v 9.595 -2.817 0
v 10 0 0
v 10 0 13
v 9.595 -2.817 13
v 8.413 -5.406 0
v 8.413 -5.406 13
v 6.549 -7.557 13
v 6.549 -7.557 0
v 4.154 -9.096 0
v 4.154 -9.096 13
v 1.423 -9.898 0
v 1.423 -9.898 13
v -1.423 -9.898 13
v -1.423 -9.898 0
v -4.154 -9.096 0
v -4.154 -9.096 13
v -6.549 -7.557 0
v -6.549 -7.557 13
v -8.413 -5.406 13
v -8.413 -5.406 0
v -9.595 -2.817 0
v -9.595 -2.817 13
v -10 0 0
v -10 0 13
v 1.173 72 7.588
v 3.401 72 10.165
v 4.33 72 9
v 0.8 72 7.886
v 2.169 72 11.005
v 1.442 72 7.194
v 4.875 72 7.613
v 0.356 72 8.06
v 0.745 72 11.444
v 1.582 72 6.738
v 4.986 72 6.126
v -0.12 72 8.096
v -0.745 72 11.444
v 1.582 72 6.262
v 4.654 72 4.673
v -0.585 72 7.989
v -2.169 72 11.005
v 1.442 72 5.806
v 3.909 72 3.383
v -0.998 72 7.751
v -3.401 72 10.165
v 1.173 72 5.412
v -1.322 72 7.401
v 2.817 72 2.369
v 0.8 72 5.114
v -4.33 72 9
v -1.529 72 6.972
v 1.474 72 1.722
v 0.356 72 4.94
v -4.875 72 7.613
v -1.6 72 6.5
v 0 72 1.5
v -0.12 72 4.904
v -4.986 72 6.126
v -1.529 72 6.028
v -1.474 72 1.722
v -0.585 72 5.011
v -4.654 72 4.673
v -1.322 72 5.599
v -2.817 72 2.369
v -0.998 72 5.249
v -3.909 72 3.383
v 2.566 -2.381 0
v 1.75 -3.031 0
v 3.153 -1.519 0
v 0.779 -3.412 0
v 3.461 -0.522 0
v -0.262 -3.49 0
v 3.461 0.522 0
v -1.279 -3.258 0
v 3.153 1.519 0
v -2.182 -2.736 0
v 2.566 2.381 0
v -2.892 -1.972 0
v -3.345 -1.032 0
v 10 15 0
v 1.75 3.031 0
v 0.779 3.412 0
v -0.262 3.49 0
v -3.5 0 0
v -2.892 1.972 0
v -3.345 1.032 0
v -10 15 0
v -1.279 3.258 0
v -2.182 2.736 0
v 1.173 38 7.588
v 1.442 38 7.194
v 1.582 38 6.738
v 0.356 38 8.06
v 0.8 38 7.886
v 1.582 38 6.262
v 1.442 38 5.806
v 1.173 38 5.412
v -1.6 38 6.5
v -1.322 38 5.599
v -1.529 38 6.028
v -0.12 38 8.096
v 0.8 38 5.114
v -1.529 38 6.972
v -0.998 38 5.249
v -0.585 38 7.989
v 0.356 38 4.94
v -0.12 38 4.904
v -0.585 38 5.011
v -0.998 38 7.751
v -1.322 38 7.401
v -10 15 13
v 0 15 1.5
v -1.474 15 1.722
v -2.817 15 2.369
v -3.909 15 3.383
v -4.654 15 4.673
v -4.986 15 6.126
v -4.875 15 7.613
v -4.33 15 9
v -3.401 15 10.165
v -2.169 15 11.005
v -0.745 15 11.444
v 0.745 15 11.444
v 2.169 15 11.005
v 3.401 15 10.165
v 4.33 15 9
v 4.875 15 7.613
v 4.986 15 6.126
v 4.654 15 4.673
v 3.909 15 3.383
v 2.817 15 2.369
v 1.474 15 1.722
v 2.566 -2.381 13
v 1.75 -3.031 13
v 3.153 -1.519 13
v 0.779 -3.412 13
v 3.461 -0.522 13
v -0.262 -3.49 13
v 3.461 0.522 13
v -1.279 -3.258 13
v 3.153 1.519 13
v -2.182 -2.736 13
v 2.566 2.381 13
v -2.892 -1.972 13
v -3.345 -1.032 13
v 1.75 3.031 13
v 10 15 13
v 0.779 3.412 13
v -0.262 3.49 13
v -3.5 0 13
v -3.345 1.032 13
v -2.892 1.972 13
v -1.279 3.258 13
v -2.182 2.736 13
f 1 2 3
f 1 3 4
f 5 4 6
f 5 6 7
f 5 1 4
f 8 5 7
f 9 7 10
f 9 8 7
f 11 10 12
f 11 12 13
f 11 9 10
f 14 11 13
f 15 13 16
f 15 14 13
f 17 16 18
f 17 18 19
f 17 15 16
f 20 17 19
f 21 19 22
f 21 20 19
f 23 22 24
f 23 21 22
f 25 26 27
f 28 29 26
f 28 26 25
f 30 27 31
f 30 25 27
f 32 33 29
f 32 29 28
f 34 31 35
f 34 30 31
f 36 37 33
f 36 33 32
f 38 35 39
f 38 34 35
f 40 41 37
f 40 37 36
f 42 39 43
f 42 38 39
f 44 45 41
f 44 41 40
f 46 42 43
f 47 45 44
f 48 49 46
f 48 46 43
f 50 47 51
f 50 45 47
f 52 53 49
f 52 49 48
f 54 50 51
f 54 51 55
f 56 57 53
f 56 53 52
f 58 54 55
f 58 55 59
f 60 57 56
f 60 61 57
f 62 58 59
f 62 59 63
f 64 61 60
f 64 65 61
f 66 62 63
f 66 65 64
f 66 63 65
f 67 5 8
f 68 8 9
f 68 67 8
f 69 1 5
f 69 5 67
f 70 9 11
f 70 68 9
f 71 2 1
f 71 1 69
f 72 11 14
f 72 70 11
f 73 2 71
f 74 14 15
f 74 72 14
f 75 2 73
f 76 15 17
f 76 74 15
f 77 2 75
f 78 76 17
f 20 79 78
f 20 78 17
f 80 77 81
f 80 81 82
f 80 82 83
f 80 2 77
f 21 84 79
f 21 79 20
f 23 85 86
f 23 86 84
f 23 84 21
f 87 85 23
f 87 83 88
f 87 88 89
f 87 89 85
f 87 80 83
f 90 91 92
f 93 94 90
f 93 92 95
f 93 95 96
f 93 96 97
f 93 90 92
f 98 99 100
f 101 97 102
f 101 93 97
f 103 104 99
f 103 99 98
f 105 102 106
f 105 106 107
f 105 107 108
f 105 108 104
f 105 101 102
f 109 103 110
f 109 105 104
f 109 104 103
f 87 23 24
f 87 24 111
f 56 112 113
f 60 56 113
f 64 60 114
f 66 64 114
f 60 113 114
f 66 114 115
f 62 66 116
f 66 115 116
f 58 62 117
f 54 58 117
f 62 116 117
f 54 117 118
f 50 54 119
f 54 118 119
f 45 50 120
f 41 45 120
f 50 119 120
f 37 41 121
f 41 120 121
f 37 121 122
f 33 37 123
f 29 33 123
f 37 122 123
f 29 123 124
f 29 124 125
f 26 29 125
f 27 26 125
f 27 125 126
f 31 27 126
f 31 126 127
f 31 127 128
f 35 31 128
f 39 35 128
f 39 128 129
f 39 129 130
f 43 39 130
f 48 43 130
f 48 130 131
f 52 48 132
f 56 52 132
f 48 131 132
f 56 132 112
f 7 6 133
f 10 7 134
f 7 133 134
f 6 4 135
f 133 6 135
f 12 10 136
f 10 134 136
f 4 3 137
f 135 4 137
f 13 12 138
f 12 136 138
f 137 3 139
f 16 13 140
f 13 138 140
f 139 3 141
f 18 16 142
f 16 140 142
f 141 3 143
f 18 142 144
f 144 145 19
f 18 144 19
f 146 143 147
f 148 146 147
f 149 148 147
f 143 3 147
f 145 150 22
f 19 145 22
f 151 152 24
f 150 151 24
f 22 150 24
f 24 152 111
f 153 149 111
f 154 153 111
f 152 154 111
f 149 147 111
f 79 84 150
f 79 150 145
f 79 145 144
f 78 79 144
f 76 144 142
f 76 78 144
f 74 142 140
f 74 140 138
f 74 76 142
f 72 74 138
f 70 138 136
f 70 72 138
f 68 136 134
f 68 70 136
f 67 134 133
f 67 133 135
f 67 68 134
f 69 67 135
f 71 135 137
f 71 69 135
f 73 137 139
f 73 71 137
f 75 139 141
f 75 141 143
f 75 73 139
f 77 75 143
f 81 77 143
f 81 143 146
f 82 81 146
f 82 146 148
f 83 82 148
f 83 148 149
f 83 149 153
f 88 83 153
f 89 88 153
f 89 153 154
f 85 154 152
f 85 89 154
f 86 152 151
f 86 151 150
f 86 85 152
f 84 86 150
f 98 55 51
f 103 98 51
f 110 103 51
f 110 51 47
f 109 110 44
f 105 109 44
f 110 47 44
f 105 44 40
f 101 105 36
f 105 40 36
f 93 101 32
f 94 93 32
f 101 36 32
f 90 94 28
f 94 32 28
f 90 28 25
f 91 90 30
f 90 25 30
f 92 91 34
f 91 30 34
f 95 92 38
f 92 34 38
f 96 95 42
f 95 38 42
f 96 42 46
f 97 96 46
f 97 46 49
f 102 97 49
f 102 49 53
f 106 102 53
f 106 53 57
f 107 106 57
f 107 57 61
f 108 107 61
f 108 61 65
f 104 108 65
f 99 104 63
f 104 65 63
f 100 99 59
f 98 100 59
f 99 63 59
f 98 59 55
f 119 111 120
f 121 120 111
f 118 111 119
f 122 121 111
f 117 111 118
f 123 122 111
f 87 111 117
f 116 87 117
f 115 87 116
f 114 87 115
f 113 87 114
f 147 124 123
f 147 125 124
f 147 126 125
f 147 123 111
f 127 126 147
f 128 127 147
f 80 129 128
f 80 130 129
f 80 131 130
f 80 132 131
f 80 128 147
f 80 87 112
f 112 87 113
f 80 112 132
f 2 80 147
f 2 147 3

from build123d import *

# Parameters (mm, degrees)
ESBO_O1_R                = 3.5
RESSALTO_EXTRUS_O1_DEPTH = 13
ESBO_O2_R                = 5
RESSALTO_EXTRUS_O2_DEPTH = 57
ESBO_O3_R                = 1.6
CORTE_EXTRUS_O1_DEPTH    = 34


with BuildPart() as part:
    # Esboço1 → Ressalto-extrusão1 (new body)
    with BuildSketch(Plane.XY):
        with BuildLine():
            Line((-10, 0), (-10, 15))
            Line((-10, 15), (10, 15))
            Line((10, 15), (10, 0))
            ThreePointArc((10, 0), (0, -10), (-10, 0))
        make_face()
        with Locations(Location((0, 0, 0), (0, 0, 180))):
            Circle(ESBO_O1_R, mode=Mode.SUBTRACT)
    extrude(amount=RESSALTO_EXTRUS_O1_DEPTH)

    # Esboço2 → Ressalto-extrusão2 (add)
    with BuildSketch(Plane(origin=(0, 15, 0), x_dir=(1, 0, 0), z_dir=(0, 1, 0))):
        with Locations(Location((0, -6.5, 0), (0, 0, 90))):
            Circle(ESBO_O2_R)
    extrude(amount=RESSALTO_EXTRUS_O2_DEPTH)

    # Esboço3 → Corte-extrusão1 (cut)
    with BuildSketch(Plane(origin=(0, 72, 0), x_dir=(1, 0, 0), z_dir=(0, 1, 0))):
        with Locations(Location((0, -6.5, 0), (0, 0, 180))):
            Circle(ESBO_O3_R)
    extrude(amount=-CORTE_EXTRUS_O1_DEPTH, mode=Mode.SUBTRACT)


solid = part.part
